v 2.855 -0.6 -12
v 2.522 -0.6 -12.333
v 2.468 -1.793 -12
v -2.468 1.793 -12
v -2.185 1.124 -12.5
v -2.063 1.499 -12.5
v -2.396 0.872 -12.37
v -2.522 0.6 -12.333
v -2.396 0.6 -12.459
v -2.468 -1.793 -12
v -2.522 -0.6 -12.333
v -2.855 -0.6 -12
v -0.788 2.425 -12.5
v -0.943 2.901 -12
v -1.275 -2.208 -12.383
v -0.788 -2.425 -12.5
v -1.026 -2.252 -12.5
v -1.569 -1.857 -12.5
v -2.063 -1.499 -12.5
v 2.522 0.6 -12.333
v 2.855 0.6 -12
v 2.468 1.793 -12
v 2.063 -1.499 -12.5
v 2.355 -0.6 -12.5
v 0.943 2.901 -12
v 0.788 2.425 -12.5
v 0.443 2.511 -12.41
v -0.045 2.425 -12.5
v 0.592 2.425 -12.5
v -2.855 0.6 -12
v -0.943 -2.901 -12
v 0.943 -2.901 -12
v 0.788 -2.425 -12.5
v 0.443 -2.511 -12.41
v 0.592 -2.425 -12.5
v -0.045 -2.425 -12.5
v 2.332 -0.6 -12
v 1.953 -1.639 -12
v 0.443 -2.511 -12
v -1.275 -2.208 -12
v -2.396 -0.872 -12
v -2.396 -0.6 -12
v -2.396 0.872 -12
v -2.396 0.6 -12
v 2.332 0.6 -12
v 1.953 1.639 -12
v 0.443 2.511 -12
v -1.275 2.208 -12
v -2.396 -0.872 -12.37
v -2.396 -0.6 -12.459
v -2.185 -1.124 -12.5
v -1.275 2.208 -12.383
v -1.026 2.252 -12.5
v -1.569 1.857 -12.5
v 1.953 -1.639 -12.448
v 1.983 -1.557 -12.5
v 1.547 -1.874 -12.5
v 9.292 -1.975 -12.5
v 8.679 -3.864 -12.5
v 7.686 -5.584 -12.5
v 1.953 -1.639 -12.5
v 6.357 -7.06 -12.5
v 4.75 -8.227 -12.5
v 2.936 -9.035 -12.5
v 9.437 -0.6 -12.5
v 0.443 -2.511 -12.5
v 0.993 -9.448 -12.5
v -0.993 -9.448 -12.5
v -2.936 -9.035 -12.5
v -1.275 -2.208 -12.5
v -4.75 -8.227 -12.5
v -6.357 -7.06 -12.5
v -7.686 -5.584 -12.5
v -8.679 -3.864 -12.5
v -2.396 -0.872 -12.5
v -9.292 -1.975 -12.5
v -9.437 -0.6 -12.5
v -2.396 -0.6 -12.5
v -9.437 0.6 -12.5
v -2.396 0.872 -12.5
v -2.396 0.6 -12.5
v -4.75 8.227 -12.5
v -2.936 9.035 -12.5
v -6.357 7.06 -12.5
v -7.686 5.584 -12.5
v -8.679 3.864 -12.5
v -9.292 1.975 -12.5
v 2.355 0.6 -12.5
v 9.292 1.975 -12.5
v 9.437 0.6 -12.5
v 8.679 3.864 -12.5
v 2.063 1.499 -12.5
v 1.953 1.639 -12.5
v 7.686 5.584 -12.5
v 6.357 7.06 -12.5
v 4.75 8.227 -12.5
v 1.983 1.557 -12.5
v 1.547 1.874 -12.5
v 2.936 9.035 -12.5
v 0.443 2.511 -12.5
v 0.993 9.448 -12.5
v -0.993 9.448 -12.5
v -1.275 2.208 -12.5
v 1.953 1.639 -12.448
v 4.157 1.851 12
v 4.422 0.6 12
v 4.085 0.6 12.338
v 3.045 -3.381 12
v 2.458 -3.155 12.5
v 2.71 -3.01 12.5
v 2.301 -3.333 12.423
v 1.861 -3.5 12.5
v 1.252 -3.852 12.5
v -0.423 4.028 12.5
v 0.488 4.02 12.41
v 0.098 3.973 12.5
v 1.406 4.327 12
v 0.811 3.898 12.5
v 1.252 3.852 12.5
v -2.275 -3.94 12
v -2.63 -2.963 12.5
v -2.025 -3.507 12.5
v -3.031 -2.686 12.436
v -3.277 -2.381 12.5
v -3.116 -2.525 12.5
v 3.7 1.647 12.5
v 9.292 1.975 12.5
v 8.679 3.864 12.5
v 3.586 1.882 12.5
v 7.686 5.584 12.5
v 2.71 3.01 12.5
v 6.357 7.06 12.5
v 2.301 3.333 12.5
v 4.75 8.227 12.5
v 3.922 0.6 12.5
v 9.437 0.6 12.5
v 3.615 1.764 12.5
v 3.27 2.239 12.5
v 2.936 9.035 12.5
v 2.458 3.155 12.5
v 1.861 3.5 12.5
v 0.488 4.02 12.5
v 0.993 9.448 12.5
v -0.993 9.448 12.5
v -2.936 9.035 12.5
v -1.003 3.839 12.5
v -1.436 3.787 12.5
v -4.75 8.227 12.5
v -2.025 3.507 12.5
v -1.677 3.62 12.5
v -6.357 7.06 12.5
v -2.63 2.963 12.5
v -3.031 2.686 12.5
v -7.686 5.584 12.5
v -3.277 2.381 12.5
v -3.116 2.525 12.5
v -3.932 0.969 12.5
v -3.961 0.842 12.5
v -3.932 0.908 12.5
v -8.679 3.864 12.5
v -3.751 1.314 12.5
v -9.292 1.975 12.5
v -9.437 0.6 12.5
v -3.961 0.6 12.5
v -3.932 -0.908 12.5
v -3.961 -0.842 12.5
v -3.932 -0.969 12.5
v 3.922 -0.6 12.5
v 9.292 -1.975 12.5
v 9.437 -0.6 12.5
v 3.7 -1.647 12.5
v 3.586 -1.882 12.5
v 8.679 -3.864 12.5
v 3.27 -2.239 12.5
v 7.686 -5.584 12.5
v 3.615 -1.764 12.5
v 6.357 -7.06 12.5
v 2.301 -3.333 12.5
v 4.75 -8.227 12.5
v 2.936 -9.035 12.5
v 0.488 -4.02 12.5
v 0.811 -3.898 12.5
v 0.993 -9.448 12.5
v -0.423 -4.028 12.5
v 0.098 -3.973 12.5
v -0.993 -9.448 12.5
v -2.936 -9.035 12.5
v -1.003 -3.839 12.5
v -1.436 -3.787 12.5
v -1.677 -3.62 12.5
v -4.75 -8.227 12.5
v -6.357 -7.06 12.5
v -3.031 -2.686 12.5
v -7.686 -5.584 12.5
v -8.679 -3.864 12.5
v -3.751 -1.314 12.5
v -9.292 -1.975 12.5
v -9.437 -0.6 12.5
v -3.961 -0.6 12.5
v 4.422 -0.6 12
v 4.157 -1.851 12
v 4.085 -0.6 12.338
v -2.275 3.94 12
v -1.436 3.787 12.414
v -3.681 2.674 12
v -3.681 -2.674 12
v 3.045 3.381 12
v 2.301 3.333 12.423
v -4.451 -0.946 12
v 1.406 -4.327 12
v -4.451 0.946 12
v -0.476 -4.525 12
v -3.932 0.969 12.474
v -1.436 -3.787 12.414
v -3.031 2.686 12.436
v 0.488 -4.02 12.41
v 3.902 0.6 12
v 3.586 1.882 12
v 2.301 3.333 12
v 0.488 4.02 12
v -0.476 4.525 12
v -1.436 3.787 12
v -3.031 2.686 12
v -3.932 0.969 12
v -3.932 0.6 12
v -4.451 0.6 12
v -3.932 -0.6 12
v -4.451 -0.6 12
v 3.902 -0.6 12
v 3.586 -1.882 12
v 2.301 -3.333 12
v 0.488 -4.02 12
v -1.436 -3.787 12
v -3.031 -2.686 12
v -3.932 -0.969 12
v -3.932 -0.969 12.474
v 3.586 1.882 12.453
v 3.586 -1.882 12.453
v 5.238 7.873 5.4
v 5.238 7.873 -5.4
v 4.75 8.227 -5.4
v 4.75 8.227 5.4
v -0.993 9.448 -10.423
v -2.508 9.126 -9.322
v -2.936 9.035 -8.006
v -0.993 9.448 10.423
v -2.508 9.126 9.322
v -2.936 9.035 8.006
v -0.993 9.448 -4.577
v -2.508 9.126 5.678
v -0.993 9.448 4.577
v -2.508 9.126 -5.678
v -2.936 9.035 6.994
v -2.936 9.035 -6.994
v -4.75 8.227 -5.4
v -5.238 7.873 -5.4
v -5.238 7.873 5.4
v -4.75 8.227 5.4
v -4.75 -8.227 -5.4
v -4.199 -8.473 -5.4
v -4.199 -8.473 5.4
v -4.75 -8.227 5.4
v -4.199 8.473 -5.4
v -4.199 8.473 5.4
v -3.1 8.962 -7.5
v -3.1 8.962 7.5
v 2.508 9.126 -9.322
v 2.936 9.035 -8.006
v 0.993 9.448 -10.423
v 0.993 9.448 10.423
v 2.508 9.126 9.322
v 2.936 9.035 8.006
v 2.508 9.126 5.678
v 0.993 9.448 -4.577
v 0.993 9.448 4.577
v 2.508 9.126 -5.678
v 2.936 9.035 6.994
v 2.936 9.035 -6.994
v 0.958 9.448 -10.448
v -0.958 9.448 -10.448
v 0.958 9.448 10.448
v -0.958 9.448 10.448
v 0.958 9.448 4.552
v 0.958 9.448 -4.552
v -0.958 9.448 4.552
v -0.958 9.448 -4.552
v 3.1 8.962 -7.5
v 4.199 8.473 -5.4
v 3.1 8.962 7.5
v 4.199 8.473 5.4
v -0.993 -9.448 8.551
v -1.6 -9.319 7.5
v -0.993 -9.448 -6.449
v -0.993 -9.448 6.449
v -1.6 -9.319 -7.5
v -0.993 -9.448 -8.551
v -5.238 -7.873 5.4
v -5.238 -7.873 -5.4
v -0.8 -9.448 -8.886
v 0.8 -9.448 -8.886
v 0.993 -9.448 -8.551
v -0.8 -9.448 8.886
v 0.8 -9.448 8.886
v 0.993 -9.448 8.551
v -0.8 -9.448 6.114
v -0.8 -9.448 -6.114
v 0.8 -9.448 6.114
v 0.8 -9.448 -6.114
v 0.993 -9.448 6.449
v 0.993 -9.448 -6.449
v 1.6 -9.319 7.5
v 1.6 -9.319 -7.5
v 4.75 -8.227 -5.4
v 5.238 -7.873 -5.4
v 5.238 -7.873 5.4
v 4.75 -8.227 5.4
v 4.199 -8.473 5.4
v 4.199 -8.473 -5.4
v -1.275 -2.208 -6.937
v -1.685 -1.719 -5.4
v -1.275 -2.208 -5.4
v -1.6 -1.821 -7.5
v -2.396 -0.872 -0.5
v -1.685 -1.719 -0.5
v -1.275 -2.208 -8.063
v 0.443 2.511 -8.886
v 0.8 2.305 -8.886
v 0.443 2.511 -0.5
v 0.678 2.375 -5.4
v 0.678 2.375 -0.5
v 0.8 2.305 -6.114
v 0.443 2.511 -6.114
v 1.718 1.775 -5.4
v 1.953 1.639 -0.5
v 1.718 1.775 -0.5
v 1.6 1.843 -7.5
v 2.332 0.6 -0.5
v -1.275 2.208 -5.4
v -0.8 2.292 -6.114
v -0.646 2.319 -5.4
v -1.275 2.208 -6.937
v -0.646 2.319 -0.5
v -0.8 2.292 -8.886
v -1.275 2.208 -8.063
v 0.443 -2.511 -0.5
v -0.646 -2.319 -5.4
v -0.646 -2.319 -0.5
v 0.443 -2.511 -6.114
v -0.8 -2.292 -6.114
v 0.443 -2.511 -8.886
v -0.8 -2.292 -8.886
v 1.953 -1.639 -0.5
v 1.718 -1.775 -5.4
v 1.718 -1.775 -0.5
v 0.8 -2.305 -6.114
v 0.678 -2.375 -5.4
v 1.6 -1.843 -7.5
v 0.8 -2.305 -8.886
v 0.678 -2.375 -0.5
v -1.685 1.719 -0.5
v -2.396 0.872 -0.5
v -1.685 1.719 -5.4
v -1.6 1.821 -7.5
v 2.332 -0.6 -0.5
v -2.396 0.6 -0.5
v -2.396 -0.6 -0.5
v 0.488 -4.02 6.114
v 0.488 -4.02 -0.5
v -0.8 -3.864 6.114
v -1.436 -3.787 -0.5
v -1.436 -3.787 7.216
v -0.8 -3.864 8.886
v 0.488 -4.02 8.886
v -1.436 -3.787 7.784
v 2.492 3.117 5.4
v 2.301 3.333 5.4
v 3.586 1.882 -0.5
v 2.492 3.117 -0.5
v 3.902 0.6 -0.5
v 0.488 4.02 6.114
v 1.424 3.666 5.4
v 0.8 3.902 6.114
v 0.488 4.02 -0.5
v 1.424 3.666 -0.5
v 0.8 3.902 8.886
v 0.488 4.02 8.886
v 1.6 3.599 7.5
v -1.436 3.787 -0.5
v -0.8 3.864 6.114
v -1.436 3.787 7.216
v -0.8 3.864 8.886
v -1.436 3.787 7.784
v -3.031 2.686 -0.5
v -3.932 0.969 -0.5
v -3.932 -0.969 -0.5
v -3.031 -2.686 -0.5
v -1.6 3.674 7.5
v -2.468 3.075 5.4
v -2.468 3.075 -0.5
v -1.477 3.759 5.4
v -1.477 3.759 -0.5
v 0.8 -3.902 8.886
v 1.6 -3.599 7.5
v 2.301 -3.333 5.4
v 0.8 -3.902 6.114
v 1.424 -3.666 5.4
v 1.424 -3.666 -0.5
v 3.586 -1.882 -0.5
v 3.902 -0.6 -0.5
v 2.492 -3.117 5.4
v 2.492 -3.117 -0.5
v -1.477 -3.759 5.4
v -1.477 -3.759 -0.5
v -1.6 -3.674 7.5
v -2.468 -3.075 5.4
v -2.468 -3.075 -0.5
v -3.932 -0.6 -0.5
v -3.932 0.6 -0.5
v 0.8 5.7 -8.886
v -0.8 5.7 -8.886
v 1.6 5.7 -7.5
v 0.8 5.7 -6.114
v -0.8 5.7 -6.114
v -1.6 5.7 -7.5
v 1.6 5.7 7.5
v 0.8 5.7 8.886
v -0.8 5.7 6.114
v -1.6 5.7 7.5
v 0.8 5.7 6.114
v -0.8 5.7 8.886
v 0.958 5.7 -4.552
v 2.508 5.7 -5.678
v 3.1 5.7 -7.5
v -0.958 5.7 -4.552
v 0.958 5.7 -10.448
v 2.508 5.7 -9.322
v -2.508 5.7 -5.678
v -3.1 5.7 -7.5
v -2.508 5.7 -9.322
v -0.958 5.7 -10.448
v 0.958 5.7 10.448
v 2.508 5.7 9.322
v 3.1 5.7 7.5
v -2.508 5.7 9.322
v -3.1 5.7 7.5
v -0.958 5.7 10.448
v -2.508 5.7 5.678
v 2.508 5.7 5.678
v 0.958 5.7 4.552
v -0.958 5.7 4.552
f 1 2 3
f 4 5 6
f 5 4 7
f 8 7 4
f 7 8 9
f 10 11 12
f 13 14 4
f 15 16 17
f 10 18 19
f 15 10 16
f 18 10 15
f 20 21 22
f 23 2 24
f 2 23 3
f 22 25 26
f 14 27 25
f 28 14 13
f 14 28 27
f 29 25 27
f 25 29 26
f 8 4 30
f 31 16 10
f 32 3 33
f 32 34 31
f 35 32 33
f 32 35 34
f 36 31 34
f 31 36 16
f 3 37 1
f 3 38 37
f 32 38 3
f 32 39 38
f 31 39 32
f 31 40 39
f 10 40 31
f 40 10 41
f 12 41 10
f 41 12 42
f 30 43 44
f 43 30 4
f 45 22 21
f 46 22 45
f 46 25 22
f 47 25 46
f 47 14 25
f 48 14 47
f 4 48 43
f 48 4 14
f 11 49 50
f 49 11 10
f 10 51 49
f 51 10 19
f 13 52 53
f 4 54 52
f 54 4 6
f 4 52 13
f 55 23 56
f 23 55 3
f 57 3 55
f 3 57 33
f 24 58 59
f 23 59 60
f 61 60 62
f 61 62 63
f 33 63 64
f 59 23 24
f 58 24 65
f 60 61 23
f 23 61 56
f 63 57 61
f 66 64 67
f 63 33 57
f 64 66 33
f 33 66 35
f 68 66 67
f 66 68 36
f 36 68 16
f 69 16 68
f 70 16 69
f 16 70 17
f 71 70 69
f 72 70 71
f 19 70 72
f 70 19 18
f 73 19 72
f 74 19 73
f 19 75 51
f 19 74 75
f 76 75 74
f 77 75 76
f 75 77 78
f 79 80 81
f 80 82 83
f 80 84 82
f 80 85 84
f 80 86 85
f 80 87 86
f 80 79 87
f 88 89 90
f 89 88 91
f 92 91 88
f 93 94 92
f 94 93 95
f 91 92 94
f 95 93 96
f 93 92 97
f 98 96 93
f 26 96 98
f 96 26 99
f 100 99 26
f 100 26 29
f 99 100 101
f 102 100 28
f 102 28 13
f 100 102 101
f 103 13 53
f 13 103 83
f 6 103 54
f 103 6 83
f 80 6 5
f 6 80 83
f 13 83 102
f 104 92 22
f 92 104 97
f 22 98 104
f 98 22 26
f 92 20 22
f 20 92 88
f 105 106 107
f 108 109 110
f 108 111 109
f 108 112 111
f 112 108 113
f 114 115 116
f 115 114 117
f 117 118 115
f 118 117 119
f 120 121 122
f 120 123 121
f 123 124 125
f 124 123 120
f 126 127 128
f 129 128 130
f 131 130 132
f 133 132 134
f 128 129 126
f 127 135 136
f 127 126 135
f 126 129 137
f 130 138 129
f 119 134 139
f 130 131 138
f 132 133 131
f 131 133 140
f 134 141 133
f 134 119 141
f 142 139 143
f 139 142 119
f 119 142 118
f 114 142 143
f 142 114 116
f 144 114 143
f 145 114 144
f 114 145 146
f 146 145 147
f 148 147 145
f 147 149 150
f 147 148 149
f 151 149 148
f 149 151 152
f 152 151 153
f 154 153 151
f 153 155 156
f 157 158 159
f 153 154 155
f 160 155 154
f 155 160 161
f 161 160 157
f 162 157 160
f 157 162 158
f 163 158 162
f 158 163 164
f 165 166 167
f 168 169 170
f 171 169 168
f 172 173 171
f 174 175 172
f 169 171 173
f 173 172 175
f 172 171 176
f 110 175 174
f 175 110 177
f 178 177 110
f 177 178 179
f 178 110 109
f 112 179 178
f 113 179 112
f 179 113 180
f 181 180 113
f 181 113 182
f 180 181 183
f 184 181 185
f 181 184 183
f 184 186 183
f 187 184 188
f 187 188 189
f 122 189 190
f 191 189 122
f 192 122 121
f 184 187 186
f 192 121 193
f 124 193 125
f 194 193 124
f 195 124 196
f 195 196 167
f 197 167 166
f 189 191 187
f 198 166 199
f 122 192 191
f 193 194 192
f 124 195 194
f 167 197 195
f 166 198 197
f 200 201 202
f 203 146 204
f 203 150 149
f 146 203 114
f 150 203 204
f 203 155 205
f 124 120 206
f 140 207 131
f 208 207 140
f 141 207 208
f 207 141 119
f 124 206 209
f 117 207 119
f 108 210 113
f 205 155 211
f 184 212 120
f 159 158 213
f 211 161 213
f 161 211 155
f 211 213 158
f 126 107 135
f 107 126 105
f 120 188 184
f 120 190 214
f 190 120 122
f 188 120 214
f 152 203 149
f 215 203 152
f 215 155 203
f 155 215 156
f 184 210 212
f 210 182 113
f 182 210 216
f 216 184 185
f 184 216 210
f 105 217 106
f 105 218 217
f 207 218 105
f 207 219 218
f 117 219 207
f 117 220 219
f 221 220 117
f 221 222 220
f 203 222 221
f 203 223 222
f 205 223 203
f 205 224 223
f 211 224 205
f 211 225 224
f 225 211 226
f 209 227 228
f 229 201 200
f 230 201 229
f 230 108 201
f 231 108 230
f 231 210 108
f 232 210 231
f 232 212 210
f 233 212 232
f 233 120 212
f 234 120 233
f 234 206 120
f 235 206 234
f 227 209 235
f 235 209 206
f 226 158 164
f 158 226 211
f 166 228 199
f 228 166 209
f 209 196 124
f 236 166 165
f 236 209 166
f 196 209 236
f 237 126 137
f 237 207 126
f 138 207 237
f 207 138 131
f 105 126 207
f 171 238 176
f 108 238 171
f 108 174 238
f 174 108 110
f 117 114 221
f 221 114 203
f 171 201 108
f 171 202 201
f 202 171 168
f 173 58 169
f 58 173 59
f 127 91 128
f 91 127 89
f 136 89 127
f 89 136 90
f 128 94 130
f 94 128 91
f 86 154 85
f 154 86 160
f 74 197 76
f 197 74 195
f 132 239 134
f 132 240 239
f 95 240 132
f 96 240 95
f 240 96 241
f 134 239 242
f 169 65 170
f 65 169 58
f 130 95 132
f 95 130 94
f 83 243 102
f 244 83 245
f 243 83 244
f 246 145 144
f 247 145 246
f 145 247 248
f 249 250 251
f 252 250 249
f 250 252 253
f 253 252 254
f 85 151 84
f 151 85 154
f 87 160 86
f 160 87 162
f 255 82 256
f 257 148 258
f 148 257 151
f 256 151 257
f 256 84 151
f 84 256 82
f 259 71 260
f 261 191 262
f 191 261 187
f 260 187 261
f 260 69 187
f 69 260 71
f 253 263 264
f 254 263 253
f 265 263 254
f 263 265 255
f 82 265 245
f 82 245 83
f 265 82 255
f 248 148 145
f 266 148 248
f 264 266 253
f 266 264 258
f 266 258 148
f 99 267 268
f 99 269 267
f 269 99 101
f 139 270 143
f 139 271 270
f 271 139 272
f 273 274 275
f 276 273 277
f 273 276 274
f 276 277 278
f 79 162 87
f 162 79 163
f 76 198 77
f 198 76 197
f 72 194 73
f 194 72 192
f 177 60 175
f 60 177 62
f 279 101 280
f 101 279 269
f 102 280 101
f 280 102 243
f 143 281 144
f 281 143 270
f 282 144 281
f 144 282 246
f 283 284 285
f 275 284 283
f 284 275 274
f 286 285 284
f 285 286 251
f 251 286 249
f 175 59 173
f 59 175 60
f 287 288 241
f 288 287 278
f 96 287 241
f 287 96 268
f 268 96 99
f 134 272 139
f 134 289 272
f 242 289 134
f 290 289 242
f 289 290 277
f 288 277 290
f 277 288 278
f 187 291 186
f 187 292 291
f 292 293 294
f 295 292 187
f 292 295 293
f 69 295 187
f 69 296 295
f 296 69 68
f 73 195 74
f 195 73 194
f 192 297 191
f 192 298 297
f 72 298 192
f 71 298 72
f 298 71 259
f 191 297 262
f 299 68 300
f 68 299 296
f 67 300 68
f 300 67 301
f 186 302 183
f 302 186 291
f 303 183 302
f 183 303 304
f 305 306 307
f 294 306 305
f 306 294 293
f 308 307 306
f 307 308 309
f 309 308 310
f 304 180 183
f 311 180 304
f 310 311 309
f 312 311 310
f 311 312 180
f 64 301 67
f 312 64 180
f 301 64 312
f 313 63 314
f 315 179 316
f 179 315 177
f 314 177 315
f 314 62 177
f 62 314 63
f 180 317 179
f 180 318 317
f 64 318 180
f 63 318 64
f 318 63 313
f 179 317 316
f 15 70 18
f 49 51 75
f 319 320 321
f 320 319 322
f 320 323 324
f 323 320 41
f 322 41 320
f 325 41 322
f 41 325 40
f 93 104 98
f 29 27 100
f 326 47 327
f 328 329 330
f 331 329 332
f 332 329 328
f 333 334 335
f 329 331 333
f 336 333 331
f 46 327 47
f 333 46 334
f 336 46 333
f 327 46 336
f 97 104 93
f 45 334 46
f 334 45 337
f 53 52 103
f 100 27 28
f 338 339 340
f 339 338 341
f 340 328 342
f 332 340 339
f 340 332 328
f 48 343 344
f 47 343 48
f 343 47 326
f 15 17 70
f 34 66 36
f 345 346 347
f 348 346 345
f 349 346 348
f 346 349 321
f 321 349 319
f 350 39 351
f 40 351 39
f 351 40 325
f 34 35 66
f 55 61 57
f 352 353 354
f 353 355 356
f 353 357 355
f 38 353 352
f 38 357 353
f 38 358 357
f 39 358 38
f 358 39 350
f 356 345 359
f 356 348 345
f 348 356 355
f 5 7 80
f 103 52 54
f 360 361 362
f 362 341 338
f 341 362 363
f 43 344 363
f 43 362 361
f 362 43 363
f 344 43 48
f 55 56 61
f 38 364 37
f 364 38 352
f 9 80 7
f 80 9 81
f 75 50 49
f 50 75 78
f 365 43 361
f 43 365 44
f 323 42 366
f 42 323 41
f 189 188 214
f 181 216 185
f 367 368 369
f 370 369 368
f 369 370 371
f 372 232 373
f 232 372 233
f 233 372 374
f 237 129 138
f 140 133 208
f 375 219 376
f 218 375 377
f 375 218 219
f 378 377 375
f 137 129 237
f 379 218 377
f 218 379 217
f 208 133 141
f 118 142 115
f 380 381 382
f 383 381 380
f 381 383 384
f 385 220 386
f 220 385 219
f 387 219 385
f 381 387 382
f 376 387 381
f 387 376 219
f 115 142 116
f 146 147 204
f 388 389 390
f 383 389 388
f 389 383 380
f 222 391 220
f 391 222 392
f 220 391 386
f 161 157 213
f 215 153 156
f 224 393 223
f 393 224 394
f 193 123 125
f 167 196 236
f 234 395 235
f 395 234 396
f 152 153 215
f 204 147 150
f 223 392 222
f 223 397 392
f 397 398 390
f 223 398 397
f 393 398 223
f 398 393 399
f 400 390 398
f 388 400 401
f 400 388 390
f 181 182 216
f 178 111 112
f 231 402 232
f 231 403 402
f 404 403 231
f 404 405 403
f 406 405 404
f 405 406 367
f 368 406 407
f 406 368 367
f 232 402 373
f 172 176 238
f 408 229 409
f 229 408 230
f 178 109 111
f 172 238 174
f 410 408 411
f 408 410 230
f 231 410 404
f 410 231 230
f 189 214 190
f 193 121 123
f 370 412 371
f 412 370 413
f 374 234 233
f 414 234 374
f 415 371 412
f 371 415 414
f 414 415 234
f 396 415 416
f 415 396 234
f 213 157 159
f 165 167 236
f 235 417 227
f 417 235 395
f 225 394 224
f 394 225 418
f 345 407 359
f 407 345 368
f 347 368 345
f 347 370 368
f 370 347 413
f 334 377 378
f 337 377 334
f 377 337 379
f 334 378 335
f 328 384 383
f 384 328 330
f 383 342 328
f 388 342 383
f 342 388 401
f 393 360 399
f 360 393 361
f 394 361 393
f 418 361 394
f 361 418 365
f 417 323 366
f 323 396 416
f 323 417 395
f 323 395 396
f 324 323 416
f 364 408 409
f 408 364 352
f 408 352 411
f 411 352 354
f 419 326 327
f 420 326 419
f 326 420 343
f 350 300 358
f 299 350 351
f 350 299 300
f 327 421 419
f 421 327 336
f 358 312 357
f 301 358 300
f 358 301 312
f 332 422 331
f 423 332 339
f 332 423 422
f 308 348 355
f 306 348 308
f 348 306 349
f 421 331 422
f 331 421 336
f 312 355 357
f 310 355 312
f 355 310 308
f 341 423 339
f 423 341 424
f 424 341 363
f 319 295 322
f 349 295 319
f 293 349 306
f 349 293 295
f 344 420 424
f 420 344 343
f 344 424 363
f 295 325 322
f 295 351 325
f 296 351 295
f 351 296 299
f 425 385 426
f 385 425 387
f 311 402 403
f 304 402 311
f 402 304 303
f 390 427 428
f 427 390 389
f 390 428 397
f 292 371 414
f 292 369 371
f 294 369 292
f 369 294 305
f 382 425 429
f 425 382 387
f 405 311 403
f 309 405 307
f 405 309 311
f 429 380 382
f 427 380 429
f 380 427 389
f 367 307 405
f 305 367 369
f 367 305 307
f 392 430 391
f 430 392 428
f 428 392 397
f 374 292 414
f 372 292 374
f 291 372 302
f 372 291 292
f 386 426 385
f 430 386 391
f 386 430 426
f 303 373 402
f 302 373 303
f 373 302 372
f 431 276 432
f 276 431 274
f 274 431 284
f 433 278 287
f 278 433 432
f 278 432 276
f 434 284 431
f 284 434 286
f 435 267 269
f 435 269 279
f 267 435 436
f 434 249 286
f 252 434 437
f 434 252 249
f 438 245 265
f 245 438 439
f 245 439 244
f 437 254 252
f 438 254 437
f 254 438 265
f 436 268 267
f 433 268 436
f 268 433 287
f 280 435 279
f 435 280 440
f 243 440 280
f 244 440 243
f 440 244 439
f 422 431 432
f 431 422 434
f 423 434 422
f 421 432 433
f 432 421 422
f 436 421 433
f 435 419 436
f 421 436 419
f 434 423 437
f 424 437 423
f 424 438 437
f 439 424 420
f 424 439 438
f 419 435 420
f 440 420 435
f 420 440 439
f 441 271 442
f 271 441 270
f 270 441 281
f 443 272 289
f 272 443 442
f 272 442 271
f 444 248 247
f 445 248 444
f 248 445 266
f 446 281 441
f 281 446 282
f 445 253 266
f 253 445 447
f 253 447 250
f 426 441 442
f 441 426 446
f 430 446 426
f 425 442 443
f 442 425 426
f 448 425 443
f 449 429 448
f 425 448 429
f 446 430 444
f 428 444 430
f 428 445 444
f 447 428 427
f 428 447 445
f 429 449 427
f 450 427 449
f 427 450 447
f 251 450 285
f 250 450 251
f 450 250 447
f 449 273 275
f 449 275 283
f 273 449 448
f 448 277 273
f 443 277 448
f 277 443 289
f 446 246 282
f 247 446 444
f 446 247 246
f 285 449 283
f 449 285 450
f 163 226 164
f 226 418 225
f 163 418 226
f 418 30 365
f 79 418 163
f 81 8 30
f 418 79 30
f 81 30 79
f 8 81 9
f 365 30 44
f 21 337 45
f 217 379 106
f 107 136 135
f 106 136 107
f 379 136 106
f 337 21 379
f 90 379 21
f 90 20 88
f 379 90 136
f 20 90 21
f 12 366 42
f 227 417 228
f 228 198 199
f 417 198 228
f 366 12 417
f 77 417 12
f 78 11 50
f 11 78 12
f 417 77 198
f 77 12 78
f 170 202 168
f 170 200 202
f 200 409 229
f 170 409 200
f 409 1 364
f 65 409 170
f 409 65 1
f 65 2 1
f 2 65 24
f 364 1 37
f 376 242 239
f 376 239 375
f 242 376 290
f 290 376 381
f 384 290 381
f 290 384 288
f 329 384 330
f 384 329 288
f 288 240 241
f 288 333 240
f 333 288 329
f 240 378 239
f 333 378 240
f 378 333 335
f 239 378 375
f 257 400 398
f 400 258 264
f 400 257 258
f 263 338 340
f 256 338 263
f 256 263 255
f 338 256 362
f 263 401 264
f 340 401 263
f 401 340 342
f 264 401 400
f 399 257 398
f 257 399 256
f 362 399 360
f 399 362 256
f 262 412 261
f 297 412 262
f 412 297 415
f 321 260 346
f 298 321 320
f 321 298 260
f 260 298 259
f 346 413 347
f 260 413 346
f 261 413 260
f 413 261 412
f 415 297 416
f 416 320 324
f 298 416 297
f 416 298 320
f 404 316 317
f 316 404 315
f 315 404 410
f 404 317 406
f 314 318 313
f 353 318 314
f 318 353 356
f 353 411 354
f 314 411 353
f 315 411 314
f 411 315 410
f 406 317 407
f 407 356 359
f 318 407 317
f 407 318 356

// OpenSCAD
// Parameters
primary_dimension = 5; //[2.5:10:0.1]
outer_diameter = 19; //[9.5:38:0.1]
overall_length = 25; //[12.5:50:0.1]
motor_bore_diameter = 5.1; //[2.55:10.2:0.01]
leadscrew_bore_diameter = 8.1; //[4.05:16.2:0.01]
motor_bore_depth = 12; //[6:24:0.1]
leadscrew_bore_depth = 12; //[6:24:0.1]
center_gap = 1; //[0.5:2:0.1]
flexure_length = 10; //[5:20:0.1]
flexure_slot_count = 6; //[3:12:1]
flexure_slot_width = 1.2; //[0.6:2.4:0.05]
flexure_slot_depth = 6.5; //[3.25:13:0.1]
clamp_slit_width = 1.2; //[0.6:2.4:0.05]
clamp_slit_length = 10; //[5:20:0.1]
clamp_screw_hole_diameter = 3.2; //[1.6:6.4:0.05]
clamp_screw_head_clearance_diameter = 6.2; //[3.1:12.4:0.05]
clamp_screw_head_clearance_depth = 3; //[1.5:6:0.05]
chamfer_size = 0.5; //[0.25:1:0.05]
overlap = 0.8; //[0.5:2:0.1]

// Base Shapes
module coupler_body() {
  cylinder(r=outer_diameter/2, h=overall_length, center=true);
}

module motor_shaft_bore_5mm() {
  translate([0, 0, -overall_length/2 + (motor_bore_depth + overlap)/2])
    cylinder(r=motor_bore_diameter/2, h=motor_bore_depth + overlap, center=true);
}

module leadscrew_bore_8mm() {
  translate([0, 0, overall_length/2 - (leadscrew_bore_depth + overlap)/2])
    cylinder(r=leadscrew_bore_diameter/2, h=leadscrew_bore_depth + overlap, center=true);
}

module center_stop_or_gap() {
  cylinder(r=leadscrew_bore_diameter/2, h=center_gap, center=true);
}

module motor_bore_lead_in_chamfer() {
  translate([0, 0, -overall_length/2 + chamfer_size/2])
    rotate([180, 0, 0])
    cylinder(r1=motor_bore_diameter/2 + chamfer_size, r2=motor_bore_diameter/2, h=chamfer_size, center=true);
}

module leadscrew_bore_lead_in_chamfer() {
  translate([0, 0, overall_length/2 - chamfer_size/2])
    cylinder(r1=leadscrew_bore_diameter/2 + chamfer_size, r2=leadscrew_bore_diameter/2, h=chamfer_size, center=true);
}

module shaft_clamp_slits() {
  translate([0, 0, -overall_length/2 + (clamp_slit_length + overlap)/2])
    cube([outer_diameter + overlap, clamp_slit_width, clamp_slit_length + overlap], center=true);
}

module shaft_clamp_slits_2() {
  translate([0, 0, overall_length/2 - (clamp_slit_length + overlap)/2])
    cube([outer_diameter + overlap, clamp_slit_width, clamp_slit_length + overlap], center=true);
}

module clamping_screw_holes_motor() {
  translate([0, 0, -overall_length/2 + clamp_slit_length/2])
    rotate([90, 0, 0])
    cylinder(r=clamp_screw_hole_diameter/2, h=outer_diameter + overlap, center=true);
}

module clamping_screw_holes_leadscrew() {
  translate([0, 0, overall_length/2 - clamp_slit_length/2])
    rotate([90, 0, 0])
    cylinder(r=clamp_screw_hole_diameter/2, h=outer_diameter + overlap, center=true);
}

module clamping_screw_head_clearance_motor() {
  translate([0, outer_diameter/2 - (clamp_screw_head_clearance_depth + overlap)/2, -overall_length/2 + clamp_slit_length/2])
    rotate([90, 0, 0])
    cylinder(r=clamp_screw_head_clearance_diameter/2, h=clamp_screw_head_clearance_depth + overlap, center=true);
}

module clamping_screw_head_clearance_leadscrew() {
  translate([0, outer_diameter/2 - (clamp_screw_head_clearance_depth + overlap)/2, overall_length/2 - clamp_slit_length/2])
    rotate([90, 0, 0])
    cylinder(r=clamp_screw_head_clearance_diameter/2, h=clamp_screw_head_clearance_depth + overlap, center=true);
}

module flexure_slot_seed() {
  translate([outer_diameter/2 - (flexure_slot_depth + overlap)/2, 0, 0])
    cube([flexure_slot_depth + overlap, flexure_slot_width, flexure_length + overlap], center=true);
}

// Operations
module bore_lead_in_chamfers() {
  union() {
    motor_bore_lead_in_chamfer();
    leadscrew_bore_lead_in_chamfer();
  }
}

module clamping_screw_holes() {
  union() {
    clamping_screw_holes_motor();
    clamping_screw_holes_leadscrew();
    clamping_screw_head_clearance_motor();
    clamping_screw_head_clearance_leadscrew();
  }
}

module flexure_section() {
  for (i = [0:flexure_slot_count-1]) {
    rotate([0, 0, i * 360/flexure_slot_count])
      flexure_slot_seed();
  }
}

module flex() {
  union() {
    flexure_section();
  }
}

module coupler_body_with_bores() {
  difference() {
    coupler_body();
    motor_shaft_bore_5mm();
    leadscrew_bore_8mm();
    center_stop_or_gap();
    bore_lead_in_chamfers();
  }
}

module coupler_body_with_clamps() {
  difference() {
    coupler_body_with_bores();
    shaft_clamp_slits();
    shaft_clamp_slits_2();
    clamping_screw_holes();
  }
}

module shaft_coupling() {
  difference() {
    coupler_body_with_clamps();
    flex();
  }
}

// Final Output
shaft_coupling();
